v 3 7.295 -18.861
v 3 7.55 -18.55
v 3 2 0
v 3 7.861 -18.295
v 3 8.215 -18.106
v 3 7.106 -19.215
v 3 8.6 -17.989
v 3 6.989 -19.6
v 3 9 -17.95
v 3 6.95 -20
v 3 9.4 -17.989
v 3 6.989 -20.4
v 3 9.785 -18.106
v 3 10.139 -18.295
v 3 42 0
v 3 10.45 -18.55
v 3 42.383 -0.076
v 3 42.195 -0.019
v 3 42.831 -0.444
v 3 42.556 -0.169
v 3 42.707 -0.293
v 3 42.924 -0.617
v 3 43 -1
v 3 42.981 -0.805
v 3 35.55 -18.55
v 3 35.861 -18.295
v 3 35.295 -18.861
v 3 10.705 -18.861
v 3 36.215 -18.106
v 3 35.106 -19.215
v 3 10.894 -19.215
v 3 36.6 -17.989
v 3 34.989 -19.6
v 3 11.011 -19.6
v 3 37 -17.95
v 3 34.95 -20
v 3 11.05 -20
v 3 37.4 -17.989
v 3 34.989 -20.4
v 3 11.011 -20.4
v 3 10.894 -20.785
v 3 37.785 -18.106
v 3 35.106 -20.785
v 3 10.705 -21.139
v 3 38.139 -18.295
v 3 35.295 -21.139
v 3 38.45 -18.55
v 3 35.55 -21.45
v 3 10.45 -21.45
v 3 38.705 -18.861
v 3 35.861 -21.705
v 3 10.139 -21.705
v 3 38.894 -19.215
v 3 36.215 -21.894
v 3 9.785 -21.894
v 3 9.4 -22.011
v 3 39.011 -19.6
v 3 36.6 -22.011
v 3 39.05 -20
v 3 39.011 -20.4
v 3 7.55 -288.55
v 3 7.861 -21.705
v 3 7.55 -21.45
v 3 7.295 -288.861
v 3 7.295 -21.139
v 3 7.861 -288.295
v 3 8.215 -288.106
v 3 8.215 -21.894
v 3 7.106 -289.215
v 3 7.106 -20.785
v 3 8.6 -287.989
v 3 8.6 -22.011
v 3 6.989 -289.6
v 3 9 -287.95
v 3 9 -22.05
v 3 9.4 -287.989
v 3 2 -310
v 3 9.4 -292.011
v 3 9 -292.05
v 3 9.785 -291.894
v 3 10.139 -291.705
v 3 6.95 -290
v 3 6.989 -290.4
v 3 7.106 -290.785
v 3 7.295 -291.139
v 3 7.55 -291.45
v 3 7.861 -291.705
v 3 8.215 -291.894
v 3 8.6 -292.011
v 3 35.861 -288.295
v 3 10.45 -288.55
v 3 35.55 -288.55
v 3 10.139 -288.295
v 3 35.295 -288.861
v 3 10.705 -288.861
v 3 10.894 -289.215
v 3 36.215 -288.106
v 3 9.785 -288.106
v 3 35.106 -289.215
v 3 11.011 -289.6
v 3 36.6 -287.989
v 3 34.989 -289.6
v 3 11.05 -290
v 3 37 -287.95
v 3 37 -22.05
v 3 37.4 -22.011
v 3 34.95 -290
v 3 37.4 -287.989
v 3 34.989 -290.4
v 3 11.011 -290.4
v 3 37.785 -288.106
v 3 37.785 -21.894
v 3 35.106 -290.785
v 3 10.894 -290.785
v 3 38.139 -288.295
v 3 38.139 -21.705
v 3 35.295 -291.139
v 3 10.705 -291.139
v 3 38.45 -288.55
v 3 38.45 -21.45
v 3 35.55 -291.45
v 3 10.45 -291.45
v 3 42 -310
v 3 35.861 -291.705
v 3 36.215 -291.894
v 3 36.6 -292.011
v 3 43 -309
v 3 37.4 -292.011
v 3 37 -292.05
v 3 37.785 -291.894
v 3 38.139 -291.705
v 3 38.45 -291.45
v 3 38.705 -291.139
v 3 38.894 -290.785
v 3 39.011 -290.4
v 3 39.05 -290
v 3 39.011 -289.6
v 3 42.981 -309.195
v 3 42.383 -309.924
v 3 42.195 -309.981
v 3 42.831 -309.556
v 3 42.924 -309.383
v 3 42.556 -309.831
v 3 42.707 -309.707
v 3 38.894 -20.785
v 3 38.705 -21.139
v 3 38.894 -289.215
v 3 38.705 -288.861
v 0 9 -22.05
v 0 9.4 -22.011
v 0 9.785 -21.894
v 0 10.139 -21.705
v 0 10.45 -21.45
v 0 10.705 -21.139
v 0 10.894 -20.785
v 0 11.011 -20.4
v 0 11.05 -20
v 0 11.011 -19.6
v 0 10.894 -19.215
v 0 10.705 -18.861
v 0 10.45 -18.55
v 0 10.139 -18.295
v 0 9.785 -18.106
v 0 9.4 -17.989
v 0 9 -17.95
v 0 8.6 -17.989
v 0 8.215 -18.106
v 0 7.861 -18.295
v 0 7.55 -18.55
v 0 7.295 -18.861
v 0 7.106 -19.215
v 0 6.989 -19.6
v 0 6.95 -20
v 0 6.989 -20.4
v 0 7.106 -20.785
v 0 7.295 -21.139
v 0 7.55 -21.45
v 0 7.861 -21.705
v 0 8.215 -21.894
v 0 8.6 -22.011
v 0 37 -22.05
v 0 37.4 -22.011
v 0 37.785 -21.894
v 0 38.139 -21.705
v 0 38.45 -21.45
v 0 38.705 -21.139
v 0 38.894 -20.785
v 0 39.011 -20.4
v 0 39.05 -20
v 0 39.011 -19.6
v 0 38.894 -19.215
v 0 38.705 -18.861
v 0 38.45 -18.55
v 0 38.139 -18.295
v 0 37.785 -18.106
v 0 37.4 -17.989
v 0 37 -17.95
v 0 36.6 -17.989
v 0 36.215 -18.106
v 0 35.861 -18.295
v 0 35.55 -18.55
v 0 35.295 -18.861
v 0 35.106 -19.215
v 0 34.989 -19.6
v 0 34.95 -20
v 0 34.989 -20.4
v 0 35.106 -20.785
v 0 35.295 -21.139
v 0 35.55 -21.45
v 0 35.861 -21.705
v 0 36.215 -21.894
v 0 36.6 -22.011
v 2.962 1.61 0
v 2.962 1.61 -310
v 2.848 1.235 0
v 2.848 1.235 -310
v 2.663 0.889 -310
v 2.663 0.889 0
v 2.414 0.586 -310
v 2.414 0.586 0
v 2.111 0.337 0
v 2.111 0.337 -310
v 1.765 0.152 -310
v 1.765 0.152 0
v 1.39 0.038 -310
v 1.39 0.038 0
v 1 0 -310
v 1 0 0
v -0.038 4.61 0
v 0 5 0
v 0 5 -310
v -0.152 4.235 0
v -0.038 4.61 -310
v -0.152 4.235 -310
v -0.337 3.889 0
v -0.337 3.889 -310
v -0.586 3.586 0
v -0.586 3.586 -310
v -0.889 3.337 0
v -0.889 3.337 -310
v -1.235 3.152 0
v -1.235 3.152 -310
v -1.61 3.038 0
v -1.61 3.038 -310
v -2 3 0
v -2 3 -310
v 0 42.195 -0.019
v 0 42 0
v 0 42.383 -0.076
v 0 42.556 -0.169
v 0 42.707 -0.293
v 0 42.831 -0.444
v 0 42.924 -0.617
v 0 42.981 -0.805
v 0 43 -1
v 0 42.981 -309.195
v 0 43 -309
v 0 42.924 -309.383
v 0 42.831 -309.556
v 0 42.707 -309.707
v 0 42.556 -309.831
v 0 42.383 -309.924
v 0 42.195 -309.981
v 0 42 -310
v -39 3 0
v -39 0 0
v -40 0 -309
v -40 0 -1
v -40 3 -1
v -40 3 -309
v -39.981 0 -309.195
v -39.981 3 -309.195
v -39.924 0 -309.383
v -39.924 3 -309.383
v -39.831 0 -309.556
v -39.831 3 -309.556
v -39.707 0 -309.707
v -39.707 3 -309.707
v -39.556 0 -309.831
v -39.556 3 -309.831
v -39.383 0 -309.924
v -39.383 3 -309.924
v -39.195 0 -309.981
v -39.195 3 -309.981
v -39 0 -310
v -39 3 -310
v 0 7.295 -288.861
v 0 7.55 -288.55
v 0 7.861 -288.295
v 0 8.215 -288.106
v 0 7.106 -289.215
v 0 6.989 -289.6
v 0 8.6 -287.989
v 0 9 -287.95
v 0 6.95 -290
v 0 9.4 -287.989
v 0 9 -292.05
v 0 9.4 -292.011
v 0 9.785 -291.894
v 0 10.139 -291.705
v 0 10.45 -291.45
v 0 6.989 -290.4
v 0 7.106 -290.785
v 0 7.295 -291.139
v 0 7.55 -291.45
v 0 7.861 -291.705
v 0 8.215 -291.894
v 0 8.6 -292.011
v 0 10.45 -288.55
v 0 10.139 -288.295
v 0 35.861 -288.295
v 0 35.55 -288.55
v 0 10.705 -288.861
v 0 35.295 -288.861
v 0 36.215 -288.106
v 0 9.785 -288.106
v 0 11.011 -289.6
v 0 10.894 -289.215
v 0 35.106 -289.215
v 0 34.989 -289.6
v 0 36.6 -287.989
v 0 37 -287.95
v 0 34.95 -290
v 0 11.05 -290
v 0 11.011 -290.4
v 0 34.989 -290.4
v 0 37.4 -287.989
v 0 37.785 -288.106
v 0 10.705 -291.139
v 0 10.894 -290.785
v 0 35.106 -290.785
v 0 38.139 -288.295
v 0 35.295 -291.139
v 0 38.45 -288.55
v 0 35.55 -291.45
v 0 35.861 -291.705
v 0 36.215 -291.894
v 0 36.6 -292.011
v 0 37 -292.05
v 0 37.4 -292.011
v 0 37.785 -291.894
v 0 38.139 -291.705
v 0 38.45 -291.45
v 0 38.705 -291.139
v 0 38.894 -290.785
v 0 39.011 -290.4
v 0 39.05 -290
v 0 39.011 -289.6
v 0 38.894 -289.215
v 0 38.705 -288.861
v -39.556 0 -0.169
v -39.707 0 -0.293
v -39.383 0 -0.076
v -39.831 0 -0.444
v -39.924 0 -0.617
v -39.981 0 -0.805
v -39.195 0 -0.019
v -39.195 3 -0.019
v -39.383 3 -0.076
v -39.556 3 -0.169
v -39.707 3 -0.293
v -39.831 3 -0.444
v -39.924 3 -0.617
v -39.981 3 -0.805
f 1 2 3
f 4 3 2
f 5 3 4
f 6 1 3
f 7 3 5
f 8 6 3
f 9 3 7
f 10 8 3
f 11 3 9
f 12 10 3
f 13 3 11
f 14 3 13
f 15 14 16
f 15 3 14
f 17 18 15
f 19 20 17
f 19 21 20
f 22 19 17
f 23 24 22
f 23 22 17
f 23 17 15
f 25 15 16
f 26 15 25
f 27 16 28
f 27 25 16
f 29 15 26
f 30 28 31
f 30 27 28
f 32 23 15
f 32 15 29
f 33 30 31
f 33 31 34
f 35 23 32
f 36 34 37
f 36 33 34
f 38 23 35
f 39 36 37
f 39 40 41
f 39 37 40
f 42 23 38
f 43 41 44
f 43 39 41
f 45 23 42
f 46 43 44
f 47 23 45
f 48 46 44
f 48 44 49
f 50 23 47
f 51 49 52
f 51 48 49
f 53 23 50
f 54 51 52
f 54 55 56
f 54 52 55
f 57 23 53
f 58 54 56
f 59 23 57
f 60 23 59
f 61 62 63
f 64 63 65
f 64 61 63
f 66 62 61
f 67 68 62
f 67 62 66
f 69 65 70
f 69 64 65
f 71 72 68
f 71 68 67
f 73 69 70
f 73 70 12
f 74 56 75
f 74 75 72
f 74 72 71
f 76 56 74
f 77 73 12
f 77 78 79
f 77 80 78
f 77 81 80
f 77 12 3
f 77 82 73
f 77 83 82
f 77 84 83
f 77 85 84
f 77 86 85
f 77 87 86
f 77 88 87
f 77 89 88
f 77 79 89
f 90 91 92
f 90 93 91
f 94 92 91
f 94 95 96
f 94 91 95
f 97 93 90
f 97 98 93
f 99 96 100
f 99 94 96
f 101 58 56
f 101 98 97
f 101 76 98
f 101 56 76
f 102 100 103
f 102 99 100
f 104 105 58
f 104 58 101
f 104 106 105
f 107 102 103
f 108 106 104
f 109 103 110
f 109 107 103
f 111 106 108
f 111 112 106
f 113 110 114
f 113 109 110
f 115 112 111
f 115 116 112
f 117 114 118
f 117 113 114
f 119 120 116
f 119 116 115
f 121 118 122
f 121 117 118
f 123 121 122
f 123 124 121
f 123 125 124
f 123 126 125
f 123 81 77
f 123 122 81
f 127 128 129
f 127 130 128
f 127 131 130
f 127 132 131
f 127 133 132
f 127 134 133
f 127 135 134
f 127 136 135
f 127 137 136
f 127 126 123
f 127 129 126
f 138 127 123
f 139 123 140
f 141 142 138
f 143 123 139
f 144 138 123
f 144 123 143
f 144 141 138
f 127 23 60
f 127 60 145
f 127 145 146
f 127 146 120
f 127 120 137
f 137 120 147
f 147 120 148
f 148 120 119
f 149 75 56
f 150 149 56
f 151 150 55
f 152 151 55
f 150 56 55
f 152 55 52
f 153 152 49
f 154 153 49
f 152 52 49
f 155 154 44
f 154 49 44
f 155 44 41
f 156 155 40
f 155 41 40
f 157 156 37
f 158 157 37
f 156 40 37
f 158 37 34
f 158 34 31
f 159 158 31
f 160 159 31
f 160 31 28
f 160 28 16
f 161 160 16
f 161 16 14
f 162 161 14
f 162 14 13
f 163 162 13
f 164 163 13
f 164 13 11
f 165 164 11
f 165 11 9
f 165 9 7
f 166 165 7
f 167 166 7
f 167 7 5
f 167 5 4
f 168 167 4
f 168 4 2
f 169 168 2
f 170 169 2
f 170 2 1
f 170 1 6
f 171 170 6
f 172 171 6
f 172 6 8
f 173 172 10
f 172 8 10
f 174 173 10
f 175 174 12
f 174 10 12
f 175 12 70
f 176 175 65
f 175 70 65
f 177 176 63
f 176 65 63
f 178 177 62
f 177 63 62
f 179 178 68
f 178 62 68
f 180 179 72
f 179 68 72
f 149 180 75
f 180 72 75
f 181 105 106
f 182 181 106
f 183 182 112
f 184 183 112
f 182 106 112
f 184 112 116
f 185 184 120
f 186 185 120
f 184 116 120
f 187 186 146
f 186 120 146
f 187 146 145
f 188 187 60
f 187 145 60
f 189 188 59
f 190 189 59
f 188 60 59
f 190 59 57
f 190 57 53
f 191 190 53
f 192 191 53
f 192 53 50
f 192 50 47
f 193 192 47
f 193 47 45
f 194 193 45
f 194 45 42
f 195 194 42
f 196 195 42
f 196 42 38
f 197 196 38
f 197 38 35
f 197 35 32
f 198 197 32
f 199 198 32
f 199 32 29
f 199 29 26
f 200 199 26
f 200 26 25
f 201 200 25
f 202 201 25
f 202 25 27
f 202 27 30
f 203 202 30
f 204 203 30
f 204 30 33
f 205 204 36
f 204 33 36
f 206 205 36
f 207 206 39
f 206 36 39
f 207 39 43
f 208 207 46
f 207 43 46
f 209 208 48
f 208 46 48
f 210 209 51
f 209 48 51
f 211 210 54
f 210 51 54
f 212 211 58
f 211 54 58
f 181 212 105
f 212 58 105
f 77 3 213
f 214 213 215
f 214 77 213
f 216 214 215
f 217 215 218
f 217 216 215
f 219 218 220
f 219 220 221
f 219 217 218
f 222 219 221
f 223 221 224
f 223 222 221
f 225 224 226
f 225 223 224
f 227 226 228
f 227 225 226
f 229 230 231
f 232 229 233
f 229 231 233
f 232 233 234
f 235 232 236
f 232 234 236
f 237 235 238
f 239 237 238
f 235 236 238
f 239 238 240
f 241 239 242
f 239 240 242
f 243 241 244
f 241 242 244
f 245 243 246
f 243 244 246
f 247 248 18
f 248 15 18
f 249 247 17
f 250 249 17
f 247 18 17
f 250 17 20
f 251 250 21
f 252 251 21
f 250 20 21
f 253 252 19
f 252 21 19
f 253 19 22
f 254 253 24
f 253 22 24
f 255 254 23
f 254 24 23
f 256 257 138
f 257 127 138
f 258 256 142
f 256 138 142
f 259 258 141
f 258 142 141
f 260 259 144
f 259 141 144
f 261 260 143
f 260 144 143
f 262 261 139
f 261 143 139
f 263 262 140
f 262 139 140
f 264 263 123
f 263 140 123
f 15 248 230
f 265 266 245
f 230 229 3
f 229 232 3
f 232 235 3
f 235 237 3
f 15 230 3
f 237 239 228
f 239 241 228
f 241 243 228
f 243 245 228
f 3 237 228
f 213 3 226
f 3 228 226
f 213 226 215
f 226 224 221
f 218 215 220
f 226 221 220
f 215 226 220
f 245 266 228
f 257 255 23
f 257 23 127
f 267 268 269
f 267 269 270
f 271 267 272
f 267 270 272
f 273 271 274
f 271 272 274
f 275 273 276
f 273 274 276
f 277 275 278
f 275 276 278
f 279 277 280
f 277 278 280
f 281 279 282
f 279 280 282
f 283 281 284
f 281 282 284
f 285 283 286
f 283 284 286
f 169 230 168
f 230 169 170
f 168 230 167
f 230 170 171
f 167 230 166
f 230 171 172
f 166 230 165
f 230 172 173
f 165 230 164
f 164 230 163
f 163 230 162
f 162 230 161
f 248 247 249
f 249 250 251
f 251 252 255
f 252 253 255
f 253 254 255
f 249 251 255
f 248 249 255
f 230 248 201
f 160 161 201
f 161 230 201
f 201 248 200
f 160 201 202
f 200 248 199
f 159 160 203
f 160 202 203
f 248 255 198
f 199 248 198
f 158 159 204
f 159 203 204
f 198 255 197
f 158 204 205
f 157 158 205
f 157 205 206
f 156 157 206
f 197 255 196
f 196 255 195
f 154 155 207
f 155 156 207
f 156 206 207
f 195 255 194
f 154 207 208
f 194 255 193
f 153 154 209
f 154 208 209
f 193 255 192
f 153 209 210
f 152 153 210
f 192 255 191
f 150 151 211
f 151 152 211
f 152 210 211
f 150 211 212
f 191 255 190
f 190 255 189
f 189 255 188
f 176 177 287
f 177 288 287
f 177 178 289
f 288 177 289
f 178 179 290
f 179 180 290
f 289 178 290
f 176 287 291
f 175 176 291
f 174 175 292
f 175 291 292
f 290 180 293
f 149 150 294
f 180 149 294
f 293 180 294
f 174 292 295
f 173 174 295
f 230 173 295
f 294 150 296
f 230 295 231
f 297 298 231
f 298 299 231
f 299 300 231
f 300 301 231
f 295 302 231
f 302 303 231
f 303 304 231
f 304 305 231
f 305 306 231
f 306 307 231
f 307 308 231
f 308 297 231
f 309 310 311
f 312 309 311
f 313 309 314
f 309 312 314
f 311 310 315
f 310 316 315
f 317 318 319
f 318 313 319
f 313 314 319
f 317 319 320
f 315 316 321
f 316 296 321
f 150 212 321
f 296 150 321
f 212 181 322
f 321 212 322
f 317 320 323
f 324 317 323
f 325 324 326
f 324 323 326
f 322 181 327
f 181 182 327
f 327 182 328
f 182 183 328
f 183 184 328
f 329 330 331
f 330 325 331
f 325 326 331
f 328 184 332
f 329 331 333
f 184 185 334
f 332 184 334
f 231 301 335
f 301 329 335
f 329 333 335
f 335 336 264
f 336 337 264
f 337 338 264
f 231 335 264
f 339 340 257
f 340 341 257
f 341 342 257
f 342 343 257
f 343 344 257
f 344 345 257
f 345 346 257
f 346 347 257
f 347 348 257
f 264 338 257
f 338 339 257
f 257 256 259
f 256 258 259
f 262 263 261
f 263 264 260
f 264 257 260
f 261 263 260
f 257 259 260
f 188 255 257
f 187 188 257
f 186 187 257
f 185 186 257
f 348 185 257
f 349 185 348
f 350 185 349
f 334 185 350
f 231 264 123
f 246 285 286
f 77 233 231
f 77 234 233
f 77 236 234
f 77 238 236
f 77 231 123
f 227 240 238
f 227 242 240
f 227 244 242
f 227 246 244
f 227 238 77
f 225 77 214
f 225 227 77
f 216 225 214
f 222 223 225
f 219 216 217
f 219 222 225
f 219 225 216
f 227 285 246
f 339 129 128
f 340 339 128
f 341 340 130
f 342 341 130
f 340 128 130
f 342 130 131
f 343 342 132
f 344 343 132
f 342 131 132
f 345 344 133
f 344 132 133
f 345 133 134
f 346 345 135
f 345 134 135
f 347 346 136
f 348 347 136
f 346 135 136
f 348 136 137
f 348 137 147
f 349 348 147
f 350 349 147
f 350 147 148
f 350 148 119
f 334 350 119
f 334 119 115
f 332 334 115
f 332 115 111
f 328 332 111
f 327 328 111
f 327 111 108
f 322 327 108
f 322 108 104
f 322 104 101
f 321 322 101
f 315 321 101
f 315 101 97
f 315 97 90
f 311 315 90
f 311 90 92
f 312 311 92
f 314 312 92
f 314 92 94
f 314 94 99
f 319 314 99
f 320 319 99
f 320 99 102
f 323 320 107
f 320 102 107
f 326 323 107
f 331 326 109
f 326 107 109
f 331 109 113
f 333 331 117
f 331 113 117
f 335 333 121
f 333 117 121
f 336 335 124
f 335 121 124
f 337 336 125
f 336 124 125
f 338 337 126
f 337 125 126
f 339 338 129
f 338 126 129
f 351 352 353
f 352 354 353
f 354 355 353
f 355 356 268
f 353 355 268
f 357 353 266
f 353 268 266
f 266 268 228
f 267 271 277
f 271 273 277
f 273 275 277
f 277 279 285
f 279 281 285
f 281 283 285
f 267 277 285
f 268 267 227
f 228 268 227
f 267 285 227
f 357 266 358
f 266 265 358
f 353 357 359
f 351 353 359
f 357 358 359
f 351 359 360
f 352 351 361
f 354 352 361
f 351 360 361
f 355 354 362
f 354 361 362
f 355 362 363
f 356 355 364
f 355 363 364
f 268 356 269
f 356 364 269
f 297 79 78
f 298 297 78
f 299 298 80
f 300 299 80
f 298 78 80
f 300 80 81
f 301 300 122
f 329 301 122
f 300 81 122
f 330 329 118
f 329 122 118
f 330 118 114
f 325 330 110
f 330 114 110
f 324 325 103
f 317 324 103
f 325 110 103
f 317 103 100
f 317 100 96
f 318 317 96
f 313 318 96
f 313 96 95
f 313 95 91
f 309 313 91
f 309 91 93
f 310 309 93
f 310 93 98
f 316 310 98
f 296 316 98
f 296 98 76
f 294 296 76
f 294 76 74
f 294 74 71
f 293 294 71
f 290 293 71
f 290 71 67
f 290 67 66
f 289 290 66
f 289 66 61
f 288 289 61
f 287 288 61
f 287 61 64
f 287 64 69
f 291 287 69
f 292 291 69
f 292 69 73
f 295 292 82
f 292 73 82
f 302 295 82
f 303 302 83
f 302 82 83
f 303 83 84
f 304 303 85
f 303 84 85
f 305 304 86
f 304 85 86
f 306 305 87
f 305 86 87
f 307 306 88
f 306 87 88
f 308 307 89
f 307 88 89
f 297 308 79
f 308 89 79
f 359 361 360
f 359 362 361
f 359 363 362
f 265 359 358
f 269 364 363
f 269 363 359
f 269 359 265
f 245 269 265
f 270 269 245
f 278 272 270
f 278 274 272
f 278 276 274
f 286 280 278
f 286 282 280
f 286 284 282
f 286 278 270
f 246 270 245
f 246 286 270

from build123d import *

# Parameters (mm, degrees)
SKETCH_1_W          = 310
SKETCH_1_H          = 43
EXTRUDE_1_DEPTH     = 3
SKETCH_2_W          = 40
SKETCH_2_H          = 310
EXTRUDE_2_DEPTH     = 3
FILLET_1_R          = 2
FILLET_2_R          = 2
FILLET_3_R          = 1
SKETCH_3_R          = 2.05
CUT_EXTRUDE_1_DEPTH = 44


with BuildPart() as part:
    # 草图1 → 凸台-拉伸1 (new body)
    with BuildSketch(Plane(origin=(0, 0, 0), x_dir=(0, 0, -1), z_dir=(1, 0, 0))):
        with Locations((155, 21.5)):
            Rectangle(SKETCH_1_W, SKETCH_1_H)
    extrude(amount=EXTRUDE_1_DEPTH)

    # 草图2 → 凸台-拉伸2 (add)
    with BuildSketch(Plane(origin=(0, 0, 0), x_dir=(1, 0, 0), z_dir=(0, 1, 0))):
        with Locations((-20, 155)):
            Rectangle(SKETCH_2_W, SKETCH_2_H)
    extrude(amount=EXTRUDE_2_DEPTH)

    # 圆角1
    fillet_1_edges = [part.edges().sort_by_distance(p)[0] for p in [
        (3, 0, -155),
    ]]
    fillet(fillet_1_edges, radius=FILLET_1_R)

    # 圆角2
    fillet_2_edges = [part.edges().sort_by_distance(p)[0] for p in [
        (0, 3, -155),
    ]]
    fillet(fillet_2_edges, radius=FILLET_2_R)

    # 圆角3
    fillet_3_edges = [part.edges().sort_by_distance(p)[0] for p in [
        (-40, 1.5, -310),
        (-40, 1.5, 0),
        (1.5, 43, 0),
        (1.5, 43, -310),
    ]]
    fillet(fillet_3_edges, radius=FILLET_3_R)

    # 草图3 → 切除-拉伸1 (cut, through all)
    with BuildSketch(Plane(origin=(3, 0, 0), x_dir=(0, 0, -1), z_dir=(1, 0, 0))):
        with Locations((20, 37)):
            Circle(SKETCH_3_R)
        with Locations((20, 9)):
            Circle(SKETCH_3_R)
        with Locations((290, 9)):
            Circle(SKETCH_3_R)
        with Locations((290, 37)):
            Circle(SKETCH_3_R)
    extrude(amount=-CUT_EXTRUDE_1_DEPTH, mode=Mode.SUBTRACT)


solid = part.part
